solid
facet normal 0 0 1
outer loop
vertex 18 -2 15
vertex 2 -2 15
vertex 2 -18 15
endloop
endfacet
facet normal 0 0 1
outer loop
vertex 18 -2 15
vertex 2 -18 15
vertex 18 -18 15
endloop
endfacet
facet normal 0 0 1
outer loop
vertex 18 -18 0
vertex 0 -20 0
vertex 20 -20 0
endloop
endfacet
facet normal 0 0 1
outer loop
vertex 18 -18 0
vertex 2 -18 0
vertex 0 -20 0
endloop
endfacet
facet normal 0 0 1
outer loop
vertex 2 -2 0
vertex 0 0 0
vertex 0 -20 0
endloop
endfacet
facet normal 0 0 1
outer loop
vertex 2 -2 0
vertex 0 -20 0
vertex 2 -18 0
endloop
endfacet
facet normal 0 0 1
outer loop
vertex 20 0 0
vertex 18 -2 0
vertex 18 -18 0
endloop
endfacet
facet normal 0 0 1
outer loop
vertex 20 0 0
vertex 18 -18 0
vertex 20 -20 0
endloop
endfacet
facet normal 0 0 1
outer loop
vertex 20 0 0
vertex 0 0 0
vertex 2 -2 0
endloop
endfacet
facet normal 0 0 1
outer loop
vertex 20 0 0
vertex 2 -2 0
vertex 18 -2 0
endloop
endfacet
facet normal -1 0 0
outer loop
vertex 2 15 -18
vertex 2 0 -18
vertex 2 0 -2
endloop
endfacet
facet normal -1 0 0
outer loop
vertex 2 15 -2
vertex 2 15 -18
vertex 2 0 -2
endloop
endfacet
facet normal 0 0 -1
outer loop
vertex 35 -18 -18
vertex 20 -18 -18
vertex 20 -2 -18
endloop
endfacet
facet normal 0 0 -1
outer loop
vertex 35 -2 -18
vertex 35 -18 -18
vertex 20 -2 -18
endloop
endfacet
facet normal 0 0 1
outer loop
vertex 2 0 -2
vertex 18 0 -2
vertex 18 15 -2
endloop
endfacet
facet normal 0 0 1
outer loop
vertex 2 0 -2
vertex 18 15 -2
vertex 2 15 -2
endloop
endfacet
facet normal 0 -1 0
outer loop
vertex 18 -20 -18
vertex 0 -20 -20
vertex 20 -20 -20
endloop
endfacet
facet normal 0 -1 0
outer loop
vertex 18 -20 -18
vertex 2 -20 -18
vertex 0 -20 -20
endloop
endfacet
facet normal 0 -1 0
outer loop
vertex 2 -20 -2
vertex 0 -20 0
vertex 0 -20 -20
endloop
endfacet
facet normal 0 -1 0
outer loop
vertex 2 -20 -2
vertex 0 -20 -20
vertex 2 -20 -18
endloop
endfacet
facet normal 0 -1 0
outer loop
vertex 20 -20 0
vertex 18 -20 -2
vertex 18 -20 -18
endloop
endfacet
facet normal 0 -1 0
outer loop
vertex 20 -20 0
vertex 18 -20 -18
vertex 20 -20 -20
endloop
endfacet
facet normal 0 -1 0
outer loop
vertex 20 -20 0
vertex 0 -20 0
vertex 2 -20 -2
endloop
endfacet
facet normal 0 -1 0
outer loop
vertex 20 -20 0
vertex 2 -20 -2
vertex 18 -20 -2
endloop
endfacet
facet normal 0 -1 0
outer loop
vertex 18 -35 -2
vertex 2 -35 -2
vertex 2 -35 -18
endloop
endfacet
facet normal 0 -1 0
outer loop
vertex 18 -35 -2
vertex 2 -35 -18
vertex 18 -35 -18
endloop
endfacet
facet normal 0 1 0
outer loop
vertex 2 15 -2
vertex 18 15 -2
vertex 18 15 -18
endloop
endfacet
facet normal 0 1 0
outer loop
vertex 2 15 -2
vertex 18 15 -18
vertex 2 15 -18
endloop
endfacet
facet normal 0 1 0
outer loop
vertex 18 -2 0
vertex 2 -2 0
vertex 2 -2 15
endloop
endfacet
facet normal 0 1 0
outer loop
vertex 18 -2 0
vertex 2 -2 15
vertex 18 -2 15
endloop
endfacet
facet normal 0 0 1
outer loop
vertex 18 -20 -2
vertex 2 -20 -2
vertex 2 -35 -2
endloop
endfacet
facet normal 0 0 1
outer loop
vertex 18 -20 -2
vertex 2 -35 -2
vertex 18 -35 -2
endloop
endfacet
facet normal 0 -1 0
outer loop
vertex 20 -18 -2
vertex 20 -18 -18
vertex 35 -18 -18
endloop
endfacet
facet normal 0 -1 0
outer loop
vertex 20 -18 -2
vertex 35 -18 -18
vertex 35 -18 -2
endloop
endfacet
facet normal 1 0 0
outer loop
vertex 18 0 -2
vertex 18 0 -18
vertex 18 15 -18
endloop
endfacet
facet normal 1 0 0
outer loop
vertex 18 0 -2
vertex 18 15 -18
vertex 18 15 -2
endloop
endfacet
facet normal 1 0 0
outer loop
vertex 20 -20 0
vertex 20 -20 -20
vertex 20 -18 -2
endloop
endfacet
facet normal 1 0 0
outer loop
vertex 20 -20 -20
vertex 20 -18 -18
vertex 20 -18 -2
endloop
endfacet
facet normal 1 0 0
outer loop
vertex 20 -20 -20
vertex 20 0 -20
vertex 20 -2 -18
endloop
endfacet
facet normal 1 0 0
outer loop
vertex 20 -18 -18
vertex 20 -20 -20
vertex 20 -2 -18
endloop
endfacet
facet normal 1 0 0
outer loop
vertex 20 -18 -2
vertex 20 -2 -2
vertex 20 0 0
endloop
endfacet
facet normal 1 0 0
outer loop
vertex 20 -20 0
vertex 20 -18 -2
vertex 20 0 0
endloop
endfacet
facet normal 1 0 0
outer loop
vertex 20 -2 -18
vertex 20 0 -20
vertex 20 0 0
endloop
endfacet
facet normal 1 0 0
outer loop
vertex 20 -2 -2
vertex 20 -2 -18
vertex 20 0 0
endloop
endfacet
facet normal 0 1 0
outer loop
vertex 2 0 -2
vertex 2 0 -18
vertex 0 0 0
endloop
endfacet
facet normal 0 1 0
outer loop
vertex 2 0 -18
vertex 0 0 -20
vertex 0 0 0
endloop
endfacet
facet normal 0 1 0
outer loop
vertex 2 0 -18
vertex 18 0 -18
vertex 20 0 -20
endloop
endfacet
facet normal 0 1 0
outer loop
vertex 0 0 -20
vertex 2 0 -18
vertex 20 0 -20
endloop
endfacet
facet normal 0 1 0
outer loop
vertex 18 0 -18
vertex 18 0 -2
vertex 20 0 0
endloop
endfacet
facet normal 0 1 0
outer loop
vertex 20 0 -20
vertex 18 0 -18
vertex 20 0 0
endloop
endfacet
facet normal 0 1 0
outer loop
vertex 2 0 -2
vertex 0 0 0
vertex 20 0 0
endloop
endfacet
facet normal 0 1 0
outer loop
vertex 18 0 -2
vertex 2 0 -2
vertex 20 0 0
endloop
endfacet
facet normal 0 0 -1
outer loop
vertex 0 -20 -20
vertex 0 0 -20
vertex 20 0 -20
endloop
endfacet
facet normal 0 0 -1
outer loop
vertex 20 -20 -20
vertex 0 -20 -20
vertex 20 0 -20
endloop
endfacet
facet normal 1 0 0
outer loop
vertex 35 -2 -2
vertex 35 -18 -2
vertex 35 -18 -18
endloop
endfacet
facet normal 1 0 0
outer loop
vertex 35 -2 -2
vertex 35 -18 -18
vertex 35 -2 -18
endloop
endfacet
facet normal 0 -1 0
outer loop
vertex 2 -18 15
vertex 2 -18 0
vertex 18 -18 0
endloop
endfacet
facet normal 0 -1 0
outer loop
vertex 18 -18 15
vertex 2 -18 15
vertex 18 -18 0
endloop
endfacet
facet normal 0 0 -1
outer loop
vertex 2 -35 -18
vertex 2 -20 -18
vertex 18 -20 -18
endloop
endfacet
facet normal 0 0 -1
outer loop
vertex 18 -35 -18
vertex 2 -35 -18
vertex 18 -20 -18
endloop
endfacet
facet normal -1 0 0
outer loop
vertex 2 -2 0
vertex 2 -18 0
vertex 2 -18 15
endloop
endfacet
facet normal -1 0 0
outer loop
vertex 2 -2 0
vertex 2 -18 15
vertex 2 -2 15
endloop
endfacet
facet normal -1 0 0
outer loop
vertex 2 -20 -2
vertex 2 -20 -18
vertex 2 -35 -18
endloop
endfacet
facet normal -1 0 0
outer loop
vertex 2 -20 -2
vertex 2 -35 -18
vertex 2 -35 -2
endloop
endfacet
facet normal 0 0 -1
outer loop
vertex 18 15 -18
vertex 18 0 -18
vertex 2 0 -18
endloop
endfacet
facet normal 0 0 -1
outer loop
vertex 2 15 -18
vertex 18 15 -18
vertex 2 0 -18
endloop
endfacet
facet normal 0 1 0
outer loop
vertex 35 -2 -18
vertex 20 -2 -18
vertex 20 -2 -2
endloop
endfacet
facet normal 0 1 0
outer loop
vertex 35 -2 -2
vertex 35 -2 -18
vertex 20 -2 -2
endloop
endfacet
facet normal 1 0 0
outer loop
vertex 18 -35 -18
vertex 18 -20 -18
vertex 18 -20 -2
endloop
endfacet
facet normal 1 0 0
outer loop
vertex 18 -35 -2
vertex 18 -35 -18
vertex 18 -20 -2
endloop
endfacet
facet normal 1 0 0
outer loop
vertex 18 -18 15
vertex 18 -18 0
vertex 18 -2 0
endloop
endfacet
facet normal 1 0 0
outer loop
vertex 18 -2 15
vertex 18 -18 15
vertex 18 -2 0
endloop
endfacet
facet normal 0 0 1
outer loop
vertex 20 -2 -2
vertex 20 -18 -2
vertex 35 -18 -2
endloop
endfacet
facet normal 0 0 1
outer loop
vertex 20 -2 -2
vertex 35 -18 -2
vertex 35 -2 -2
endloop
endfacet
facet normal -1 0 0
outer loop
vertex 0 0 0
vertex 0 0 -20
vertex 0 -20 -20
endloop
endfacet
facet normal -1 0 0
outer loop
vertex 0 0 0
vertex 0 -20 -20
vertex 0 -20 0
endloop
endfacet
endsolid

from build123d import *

# Parameters (mm, degrees)
F0_W     = 20
F0_H     = 20
F1_DEPTH = 20
F2_W     = 16
F2_H     = 16
F3_DEPTH = 15
F4_W     = 16
F4_H     = 16
F5_DEPTH = 15
F6_W     = 16
F6_H     = 16
F7_DEPTH = 15
F8_W     = 16
F8_H     = 16
F9_DEPTH = 15


with BuildPart() as f1:
    # F0 (on Front) → F1 (new body)
    with BuildSketch(Plane.XZ):
        with Locations((10, -10)):
            Rectangle(F0_W, F0_H)
    extrude(amount=F1_DEPTH)

    # F2 (on face) → F3 (join)
    with BuildSketch(Plane.XY):
        with Locations((10, -10)):
            Rectangle(F2_W, F2_H)
    extrude(amount=F3_DEPTH)

    # F4 (on face) → F5 (join)
    with BuildSketch(Plane(origin=(0, 0, 0), x_dir=(-1, 0, 0), z_dir=(0, 1, 0))):
        with Locations((-10, -10)):
            Rectangle(F4_W, F4_H)
    extrude(amount=F5_DEPTH)

    # F6 (on face) → F7 (join)
    with BuildSketch(Plane.YZ.offset(20)):
        with Locations((-10, -10)):
            Rectangle(F6_W, F6_H)
    extrude(amount=F7_DEPTH)

    # F8 (on face) → F9 (join)
    with BuildSketch(Plane.XZ.offset(20)):
        with Locations((10, -10)):
            Rectangle(F8_W, F8_H)
    extrude(amount=F9_DEPTH)


solid = f1.part
